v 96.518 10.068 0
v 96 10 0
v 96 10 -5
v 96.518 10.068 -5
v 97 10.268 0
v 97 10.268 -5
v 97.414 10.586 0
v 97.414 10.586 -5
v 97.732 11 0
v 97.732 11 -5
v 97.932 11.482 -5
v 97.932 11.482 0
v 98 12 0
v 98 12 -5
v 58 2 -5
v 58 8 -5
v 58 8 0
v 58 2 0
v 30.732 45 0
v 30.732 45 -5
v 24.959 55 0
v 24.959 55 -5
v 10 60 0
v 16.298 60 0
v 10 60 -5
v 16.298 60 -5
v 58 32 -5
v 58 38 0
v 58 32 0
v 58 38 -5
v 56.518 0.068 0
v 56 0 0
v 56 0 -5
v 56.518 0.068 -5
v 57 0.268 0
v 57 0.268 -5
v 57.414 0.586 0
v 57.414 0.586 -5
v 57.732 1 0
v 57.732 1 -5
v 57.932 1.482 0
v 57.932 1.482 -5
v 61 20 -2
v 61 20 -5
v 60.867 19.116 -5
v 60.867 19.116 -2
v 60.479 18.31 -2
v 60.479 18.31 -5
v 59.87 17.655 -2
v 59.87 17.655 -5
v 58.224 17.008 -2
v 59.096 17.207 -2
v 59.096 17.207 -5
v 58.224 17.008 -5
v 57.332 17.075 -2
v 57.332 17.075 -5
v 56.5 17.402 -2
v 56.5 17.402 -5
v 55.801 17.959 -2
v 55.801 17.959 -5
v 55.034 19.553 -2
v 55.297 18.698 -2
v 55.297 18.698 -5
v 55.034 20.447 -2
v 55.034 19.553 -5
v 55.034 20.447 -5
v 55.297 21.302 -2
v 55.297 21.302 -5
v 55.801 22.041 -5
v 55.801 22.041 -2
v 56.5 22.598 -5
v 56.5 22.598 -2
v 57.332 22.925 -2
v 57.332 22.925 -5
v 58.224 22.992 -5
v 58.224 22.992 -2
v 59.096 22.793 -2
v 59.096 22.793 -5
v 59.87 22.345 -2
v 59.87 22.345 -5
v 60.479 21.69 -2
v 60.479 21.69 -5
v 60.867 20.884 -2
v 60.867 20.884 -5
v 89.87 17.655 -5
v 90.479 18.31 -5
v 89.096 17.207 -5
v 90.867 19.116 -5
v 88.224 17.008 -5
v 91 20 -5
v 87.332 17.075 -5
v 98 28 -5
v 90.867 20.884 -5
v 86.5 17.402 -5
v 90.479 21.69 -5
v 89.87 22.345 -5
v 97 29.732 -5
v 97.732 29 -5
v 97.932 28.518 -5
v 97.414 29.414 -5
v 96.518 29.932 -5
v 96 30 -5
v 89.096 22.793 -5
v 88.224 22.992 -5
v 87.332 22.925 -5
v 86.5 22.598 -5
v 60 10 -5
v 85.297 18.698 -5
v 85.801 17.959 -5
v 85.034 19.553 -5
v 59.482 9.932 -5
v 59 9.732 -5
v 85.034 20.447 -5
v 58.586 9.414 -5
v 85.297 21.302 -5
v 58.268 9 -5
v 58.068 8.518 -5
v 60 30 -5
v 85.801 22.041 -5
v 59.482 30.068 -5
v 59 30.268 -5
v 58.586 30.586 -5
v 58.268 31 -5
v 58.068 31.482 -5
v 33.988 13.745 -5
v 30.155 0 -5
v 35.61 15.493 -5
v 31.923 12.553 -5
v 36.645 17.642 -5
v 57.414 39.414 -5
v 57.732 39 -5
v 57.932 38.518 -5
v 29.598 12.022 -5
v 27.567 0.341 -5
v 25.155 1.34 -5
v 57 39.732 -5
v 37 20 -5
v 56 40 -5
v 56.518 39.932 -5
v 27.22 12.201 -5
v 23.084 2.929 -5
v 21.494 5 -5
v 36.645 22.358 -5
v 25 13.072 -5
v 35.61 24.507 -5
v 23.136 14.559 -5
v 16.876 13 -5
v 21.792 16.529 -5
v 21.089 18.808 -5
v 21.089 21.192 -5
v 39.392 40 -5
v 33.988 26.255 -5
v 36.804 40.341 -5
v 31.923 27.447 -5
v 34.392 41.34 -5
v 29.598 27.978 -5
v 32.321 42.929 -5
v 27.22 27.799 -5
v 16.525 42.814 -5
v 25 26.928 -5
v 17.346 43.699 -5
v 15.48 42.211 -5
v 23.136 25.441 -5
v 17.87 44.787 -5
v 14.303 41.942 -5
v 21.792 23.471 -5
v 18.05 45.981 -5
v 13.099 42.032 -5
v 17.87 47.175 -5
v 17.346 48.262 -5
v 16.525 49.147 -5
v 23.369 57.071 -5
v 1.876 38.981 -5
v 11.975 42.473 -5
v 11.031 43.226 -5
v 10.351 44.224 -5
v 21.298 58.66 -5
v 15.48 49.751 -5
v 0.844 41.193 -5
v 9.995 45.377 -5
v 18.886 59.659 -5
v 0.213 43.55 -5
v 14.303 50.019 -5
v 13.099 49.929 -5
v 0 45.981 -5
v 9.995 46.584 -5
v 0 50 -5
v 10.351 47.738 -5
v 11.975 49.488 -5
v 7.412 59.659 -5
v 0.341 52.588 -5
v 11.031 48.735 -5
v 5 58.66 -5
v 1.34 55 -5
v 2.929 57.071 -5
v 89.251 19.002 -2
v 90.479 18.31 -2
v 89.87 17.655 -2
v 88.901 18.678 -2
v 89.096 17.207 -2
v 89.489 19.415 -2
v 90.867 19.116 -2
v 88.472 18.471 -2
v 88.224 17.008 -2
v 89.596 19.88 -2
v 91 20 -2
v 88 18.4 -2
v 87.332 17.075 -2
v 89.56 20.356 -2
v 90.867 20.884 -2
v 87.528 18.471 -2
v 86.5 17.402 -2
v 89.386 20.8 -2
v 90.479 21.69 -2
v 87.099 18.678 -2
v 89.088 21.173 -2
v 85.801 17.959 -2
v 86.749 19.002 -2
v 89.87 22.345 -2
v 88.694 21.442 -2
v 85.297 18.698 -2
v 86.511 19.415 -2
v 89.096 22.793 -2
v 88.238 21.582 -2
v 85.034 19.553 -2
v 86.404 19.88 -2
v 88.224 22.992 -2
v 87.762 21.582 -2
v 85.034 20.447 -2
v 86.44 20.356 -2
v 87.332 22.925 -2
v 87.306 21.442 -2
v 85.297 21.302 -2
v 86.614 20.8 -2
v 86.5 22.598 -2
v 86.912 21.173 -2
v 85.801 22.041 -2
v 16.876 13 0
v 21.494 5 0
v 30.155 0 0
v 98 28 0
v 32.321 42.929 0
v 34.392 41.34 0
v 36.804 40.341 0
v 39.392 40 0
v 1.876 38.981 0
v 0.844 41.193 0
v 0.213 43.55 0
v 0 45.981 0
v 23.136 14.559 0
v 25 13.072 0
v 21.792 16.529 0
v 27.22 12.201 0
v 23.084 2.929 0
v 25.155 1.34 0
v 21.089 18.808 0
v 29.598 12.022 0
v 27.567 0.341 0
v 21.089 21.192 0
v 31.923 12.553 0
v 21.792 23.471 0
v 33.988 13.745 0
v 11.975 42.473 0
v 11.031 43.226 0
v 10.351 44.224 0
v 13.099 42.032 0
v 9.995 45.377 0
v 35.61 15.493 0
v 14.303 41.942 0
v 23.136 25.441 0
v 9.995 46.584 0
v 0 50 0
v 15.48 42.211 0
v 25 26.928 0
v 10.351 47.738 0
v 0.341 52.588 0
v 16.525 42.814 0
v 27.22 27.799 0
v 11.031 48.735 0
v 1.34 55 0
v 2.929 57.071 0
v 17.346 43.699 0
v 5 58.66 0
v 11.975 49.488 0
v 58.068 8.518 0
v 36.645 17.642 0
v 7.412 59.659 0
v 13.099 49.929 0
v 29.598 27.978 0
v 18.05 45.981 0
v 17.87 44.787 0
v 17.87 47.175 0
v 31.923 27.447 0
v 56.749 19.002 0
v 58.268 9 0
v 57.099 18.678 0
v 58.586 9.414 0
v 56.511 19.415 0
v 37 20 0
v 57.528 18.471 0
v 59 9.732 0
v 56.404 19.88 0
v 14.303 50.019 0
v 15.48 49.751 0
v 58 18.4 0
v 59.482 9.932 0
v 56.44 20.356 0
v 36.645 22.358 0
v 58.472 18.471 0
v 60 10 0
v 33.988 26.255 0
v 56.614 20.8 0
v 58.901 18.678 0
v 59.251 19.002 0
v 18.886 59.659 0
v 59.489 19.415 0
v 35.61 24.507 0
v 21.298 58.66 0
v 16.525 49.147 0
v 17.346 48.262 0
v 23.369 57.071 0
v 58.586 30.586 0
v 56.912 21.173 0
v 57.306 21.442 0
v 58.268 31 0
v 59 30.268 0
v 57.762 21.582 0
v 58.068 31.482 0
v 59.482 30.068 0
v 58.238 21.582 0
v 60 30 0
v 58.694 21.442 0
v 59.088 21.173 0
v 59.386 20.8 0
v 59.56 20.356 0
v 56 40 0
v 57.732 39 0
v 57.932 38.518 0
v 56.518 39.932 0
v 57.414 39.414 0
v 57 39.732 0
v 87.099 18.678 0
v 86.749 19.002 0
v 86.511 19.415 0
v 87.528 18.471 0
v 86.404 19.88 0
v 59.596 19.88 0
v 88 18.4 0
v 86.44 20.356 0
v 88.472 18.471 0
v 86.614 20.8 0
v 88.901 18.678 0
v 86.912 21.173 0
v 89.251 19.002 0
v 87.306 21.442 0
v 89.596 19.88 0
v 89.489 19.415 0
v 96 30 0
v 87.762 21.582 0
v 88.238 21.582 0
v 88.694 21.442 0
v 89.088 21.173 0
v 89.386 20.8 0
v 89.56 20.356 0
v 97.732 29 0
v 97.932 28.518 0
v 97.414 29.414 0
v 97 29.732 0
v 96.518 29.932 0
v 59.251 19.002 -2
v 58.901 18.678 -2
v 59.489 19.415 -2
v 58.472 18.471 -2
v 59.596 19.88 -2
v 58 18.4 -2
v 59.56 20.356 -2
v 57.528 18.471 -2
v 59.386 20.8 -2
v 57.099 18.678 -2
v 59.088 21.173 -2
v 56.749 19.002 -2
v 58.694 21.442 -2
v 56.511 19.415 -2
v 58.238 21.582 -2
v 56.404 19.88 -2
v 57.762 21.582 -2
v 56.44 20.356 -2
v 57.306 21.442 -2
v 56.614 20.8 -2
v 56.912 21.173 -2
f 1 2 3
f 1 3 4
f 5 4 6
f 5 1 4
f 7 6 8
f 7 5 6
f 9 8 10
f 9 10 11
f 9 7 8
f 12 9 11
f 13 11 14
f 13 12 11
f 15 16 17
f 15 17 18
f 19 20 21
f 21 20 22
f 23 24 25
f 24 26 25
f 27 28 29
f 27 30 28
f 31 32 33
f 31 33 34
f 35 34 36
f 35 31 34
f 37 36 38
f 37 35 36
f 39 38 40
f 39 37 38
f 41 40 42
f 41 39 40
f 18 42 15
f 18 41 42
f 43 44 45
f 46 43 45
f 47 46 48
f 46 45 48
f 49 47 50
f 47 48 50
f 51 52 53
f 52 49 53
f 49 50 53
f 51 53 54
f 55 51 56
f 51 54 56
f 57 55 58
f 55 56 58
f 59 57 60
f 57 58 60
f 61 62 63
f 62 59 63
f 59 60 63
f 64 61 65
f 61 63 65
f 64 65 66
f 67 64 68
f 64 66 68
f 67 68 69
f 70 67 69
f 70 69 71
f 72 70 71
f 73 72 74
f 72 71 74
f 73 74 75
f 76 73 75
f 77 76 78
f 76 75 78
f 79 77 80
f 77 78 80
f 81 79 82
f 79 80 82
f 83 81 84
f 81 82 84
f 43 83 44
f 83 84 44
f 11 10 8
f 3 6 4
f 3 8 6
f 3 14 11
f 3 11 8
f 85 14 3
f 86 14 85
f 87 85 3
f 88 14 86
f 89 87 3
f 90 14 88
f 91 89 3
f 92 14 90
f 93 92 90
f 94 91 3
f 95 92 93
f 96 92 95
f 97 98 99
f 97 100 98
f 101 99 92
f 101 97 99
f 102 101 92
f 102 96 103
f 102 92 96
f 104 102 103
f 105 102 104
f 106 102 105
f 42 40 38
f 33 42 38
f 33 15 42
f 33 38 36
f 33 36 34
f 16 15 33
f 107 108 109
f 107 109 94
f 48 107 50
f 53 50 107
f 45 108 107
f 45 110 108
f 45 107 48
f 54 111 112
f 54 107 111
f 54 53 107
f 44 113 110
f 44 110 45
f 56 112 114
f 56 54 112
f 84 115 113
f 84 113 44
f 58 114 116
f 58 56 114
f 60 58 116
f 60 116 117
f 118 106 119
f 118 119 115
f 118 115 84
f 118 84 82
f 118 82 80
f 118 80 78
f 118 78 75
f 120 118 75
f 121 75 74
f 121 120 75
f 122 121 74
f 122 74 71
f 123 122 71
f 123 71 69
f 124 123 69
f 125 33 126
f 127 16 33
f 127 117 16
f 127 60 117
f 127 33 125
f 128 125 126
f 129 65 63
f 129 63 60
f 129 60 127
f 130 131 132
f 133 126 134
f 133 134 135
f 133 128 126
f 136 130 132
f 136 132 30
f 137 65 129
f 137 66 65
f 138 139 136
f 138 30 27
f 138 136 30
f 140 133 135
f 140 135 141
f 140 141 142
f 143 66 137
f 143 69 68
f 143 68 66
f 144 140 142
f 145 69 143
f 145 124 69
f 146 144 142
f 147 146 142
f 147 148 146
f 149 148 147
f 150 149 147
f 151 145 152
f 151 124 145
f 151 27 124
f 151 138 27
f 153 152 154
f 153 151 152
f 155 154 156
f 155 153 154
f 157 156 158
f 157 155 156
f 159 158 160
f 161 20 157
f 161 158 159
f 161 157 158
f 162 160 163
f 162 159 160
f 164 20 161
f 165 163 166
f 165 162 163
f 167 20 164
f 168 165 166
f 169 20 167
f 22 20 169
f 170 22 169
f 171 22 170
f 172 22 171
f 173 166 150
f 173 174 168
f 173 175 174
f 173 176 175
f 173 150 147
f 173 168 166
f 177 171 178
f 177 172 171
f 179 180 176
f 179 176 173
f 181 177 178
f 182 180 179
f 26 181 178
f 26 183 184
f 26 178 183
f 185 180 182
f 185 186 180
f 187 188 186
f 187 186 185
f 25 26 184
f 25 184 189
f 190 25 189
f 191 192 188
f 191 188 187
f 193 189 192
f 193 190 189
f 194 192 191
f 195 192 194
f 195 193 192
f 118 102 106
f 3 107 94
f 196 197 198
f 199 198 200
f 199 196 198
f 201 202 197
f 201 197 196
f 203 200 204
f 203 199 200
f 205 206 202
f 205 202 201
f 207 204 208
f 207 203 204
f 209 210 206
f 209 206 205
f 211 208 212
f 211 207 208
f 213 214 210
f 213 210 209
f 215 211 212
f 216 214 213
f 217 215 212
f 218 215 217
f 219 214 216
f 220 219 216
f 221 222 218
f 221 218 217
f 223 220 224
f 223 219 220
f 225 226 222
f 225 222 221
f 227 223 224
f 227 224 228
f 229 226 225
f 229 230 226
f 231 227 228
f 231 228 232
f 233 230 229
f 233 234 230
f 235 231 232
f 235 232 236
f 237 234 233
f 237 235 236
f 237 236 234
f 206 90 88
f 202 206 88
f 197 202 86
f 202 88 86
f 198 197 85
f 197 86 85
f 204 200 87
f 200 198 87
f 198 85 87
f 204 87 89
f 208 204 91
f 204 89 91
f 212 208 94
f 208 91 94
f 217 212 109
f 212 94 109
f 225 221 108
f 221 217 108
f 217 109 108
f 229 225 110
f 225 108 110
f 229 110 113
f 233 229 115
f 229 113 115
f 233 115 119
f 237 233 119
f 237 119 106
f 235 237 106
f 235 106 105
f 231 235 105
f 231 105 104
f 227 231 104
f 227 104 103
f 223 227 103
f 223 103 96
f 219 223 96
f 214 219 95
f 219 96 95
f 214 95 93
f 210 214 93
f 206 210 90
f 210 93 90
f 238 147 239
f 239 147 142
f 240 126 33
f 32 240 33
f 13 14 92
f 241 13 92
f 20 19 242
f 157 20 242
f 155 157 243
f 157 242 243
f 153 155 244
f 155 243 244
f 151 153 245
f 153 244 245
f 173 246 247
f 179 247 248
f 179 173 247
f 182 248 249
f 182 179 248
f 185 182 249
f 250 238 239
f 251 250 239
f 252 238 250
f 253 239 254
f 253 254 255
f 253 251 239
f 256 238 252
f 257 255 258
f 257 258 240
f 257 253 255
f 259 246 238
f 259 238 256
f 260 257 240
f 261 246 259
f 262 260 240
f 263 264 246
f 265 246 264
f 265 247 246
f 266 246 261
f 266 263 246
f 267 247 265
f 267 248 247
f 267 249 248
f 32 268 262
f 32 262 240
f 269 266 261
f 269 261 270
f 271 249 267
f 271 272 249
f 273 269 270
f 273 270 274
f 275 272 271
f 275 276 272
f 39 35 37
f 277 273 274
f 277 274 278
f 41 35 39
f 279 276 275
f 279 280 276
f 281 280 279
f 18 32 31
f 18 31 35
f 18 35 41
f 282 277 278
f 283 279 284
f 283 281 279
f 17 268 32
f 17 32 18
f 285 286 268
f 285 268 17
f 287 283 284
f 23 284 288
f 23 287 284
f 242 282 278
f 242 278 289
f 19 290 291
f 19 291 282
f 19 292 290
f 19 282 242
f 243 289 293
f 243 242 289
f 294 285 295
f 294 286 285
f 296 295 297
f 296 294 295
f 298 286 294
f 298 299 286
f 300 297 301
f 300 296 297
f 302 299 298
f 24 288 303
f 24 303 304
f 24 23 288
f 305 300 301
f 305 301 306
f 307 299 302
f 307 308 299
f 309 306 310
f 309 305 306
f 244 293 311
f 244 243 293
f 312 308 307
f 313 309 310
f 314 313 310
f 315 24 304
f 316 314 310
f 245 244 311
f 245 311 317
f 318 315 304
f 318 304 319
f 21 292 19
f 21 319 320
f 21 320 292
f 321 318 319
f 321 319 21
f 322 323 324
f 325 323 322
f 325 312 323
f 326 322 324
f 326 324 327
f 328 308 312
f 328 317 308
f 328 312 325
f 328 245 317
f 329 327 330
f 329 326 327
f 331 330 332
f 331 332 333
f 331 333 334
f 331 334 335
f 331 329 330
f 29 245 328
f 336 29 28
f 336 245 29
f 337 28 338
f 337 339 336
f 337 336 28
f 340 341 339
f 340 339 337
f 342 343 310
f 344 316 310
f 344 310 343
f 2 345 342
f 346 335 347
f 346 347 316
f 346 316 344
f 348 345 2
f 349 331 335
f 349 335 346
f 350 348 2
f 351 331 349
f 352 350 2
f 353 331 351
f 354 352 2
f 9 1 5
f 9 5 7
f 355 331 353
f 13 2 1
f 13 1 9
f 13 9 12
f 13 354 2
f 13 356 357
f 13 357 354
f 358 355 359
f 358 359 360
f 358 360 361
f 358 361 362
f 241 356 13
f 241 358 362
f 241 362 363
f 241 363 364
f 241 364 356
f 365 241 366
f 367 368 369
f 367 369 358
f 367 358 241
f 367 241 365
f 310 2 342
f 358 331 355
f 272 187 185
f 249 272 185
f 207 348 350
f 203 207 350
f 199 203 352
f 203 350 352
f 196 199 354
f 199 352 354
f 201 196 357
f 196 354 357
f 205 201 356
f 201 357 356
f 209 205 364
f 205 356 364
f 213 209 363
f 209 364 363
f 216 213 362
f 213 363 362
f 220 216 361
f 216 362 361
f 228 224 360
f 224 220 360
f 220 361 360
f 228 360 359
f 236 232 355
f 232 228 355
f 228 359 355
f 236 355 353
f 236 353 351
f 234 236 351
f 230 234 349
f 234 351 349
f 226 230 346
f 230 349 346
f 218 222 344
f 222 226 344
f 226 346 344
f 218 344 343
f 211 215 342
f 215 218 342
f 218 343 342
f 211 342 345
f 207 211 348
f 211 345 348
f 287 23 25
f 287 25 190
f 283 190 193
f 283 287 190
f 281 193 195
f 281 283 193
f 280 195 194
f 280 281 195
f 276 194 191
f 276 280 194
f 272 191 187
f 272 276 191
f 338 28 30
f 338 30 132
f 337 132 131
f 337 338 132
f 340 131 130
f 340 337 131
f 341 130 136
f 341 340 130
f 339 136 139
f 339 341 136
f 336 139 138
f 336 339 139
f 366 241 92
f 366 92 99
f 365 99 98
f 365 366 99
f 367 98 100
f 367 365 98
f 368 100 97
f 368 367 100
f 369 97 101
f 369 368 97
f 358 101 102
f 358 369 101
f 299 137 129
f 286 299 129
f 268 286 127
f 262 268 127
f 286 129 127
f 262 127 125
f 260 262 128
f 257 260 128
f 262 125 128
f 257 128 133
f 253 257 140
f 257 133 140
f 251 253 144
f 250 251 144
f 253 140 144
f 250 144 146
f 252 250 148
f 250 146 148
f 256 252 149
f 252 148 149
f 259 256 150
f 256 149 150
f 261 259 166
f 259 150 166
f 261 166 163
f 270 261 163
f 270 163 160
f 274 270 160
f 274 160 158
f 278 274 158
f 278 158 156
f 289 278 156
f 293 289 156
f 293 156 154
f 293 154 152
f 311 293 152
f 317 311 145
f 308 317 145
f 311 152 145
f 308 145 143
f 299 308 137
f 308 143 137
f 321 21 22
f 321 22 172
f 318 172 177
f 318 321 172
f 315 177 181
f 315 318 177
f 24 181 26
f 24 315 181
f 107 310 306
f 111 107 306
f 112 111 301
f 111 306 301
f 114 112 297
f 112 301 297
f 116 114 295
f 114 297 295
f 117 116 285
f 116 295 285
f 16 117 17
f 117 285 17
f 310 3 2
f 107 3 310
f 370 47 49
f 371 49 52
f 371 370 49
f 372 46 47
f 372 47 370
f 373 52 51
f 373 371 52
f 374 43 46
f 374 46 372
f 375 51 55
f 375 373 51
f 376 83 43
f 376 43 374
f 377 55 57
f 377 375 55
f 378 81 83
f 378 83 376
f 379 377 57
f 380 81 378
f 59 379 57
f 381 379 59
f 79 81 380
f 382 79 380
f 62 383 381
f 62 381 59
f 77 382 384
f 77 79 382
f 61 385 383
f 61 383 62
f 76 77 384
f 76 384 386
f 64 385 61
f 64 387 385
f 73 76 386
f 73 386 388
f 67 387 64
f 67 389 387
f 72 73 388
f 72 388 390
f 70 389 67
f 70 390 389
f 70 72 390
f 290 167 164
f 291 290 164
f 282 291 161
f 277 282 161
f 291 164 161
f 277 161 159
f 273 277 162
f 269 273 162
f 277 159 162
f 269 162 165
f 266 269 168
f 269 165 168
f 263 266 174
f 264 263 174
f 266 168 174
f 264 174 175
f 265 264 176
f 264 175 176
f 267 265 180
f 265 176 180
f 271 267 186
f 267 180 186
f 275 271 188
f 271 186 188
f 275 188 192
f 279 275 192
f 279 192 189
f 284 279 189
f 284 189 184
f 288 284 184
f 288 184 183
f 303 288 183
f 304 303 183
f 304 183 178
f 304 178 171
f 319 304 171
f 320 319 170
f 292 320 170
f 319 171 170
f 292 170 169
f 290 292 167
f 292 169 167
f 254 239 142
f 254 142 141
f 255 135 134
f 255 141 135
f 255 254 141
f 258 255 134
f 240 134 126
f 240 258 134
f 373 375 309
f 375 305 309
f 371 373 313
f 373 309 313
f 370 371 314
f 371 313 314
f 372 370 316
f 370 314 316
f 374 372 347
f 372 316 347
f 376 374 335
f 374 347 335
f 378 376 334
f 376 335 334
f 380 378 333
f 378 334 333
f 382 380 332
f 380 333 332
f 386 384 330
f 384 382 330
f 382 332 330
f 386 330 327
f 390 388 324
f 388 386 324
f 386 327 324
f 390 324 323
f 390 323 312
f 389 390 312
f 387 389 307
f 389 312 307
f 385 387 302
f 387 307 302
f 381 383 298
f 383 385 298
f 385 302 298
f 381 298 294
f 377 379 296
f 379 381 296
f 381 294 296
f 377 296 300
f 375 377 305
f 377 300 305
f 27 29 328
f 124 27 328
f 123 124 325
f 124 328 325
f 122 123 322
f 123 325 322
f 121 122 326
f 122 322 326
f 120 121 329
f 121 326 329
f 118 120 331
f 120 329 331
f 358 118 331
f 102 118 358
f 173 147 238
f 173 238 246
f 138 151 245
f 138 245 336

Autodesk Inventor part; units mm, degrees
ref_plane "YZ Plane" through (0, 0, 0) normal (1, 0, 0) x (0, 1, 0)
ref_plane "XZ Plane" through (0, 0, 0) normal (0, 1, 0) x (-1, 0, 0)
ref_plane "XY Plane" through (0, 0, 0) normal (0, 0, 1) x (1, 0, 0)
sketch "スケッチ1" plane through (0, 0, 0) normal (0, 0, 1) x (1, 0, 0)
  line L0 (0, 0) -> (98, 0)
  line L1 (98, 0) -> (98, 60)
  line L2 (98, 60) -> (0, 60)
  line L3 (0, 60) -> (0, 0)
  line L4 (98, 0) -> (29, 0)
  line L5 (29, 0) -> (29, 40)
  line L6 (29, 40) -> (98, 40)
  line L7 (98, 40) -> (98, 0)
  line L8 (29, 30) -> (98, 30)
  line L9 (98, 30) -> (98, 10)
  line L10 (98, 10) -> (29, 10)
  line L11 (29, 10) -> (29, 30)
  line L12 (98, 20) -> (0, 20)
  line L13 (29, 20) -> (5.906, 60)
  circle A0 centre (29, 20) radius 8
  circle A1 centre (14, 45.9808) radius 4.05
  line L14 (58, 40) -> (58, 0)
  line L15 (16.8756, 13) -> (-6.2184, 53)
  line L16 (41.1244, 27) -> (18.0303, 67)
  circle A2 centre (14, 45.9808) radius 14
  line L17 (16.8756, 13) -> (25.3526, -1.6825)
  point P0 (58, 30)
  point P1 (33.6188, 40)
  point P2 (22.0718, 60)
  point P3 (0, 45.9808)
  point P4 (1.8756, 38.9808)
  point P5 (24.3812, 0)
  point P6 (58, 0)
  point P7 (58, 10)
  dimension "d0" = 98
  dimension "d1" = 60
  dimension "d2" = 40
  dimension "d3" = 20
  dimension "d4" = 10
  dimension "d5" = 69
  dimension "d6" = 30
  dimension "d7" = 16
  dimension "d8" = 30
  dimension "d9" = 8.1
  dimension "d10" = 40
  dimension "d11" = 28
extrude "押し出し1" add sketch "スケッチ1" along normal blind 5 contours L5 L10 L14 L0 | L0 L17 L15 L12 A0 L5 | L5 A0 L12 L14 L10 | L14 L12 L1 L10 | L14 L8 L1 L12 | L12 A0 L5 L8 L14 | L15 A2 L13 A0 L12 | L8 L16 L6 L14 | A2 L13 A1 | A0 L13 A2 L16 L6 L5 | L8 L5 L6 L16 | L3 L2 L13 A2 | L13 A1 A2 | L13 L2 L16 A2
sketch "スケッチ2" plane through (0, 0, 5) normal (0, 0, 1) x (1, 0, 0)
  line L0 (98, 10) -> (98, 30) projected
  line L1 (98, 20) -> (47.1161, 20)
  point P0 (0, 0)
  point P1 (88, 20)
  point P2 (58, 20)
  dimension "d14" = 10
  dimension "d15" = 30
hole "穴1" at (88, 20, 5) at (58, 20, 5) direction (0, 0, -1) diameter 3.2 depth 10
fillet "フィレット1" radius 2 6 edges at (58, 40, 2.5) (58, 30, 2.5) (98, 30, 2.5) (98, 10, 2.5) (58, 0, 2.5) (58, 10, 2.5)
fillet "フィレット2" radius 10 4 edges at (24.3812, 0, 2.5) (0, 60, 2.5) (22.0718, 60, 2.5) (33.6188, 40, 2.5)
sketch "スケッチ4" plane through (0, 0, 5) normal (0, 0, 1) x (1, 0, 0)
  circle A0 centre (58, 20) radius 1.6 projected
  circle A1 centre (58, 20) radius 3
  circle A2 centre (88, 20) radius 1.6 projected
  circle A3 centre (88, 20) radius 3
  point P0 (0, 0)
  dimension "d34" = 6
  dimension "d35" = 6
extrude "押し出し2" cut sketch "スケッチ4" against normal blind 3 contours A0 | A1 | A2 | A3
mirror "ミラー1" about plane through (0, 0, 0) normal (0, 0, 1)
sketch "スケッチ5" plane through (0, 0, 5) normal (0, 0, 1) x (1, 0, 0)
  line L0 (-47.2923, 84.9681) -> (163.8235, 84.9681)
  line L1 (163.8235, 84.9681) -> (163.8235, -15.7821)
  line L2 (163.8235, -15.7821) -> (-47.2923, -15.7821)
  line L3 (-47.2923, -15.7821) -> (-47.2923, 84.9681)
  point P0 (0, 0)
extrude "押し出し3" cut sketch "スケッチ5" against normal blind 5
equation "\"d35\" = d34"
properties part number "RP_Calf-Link-cover-Outside-Left"
